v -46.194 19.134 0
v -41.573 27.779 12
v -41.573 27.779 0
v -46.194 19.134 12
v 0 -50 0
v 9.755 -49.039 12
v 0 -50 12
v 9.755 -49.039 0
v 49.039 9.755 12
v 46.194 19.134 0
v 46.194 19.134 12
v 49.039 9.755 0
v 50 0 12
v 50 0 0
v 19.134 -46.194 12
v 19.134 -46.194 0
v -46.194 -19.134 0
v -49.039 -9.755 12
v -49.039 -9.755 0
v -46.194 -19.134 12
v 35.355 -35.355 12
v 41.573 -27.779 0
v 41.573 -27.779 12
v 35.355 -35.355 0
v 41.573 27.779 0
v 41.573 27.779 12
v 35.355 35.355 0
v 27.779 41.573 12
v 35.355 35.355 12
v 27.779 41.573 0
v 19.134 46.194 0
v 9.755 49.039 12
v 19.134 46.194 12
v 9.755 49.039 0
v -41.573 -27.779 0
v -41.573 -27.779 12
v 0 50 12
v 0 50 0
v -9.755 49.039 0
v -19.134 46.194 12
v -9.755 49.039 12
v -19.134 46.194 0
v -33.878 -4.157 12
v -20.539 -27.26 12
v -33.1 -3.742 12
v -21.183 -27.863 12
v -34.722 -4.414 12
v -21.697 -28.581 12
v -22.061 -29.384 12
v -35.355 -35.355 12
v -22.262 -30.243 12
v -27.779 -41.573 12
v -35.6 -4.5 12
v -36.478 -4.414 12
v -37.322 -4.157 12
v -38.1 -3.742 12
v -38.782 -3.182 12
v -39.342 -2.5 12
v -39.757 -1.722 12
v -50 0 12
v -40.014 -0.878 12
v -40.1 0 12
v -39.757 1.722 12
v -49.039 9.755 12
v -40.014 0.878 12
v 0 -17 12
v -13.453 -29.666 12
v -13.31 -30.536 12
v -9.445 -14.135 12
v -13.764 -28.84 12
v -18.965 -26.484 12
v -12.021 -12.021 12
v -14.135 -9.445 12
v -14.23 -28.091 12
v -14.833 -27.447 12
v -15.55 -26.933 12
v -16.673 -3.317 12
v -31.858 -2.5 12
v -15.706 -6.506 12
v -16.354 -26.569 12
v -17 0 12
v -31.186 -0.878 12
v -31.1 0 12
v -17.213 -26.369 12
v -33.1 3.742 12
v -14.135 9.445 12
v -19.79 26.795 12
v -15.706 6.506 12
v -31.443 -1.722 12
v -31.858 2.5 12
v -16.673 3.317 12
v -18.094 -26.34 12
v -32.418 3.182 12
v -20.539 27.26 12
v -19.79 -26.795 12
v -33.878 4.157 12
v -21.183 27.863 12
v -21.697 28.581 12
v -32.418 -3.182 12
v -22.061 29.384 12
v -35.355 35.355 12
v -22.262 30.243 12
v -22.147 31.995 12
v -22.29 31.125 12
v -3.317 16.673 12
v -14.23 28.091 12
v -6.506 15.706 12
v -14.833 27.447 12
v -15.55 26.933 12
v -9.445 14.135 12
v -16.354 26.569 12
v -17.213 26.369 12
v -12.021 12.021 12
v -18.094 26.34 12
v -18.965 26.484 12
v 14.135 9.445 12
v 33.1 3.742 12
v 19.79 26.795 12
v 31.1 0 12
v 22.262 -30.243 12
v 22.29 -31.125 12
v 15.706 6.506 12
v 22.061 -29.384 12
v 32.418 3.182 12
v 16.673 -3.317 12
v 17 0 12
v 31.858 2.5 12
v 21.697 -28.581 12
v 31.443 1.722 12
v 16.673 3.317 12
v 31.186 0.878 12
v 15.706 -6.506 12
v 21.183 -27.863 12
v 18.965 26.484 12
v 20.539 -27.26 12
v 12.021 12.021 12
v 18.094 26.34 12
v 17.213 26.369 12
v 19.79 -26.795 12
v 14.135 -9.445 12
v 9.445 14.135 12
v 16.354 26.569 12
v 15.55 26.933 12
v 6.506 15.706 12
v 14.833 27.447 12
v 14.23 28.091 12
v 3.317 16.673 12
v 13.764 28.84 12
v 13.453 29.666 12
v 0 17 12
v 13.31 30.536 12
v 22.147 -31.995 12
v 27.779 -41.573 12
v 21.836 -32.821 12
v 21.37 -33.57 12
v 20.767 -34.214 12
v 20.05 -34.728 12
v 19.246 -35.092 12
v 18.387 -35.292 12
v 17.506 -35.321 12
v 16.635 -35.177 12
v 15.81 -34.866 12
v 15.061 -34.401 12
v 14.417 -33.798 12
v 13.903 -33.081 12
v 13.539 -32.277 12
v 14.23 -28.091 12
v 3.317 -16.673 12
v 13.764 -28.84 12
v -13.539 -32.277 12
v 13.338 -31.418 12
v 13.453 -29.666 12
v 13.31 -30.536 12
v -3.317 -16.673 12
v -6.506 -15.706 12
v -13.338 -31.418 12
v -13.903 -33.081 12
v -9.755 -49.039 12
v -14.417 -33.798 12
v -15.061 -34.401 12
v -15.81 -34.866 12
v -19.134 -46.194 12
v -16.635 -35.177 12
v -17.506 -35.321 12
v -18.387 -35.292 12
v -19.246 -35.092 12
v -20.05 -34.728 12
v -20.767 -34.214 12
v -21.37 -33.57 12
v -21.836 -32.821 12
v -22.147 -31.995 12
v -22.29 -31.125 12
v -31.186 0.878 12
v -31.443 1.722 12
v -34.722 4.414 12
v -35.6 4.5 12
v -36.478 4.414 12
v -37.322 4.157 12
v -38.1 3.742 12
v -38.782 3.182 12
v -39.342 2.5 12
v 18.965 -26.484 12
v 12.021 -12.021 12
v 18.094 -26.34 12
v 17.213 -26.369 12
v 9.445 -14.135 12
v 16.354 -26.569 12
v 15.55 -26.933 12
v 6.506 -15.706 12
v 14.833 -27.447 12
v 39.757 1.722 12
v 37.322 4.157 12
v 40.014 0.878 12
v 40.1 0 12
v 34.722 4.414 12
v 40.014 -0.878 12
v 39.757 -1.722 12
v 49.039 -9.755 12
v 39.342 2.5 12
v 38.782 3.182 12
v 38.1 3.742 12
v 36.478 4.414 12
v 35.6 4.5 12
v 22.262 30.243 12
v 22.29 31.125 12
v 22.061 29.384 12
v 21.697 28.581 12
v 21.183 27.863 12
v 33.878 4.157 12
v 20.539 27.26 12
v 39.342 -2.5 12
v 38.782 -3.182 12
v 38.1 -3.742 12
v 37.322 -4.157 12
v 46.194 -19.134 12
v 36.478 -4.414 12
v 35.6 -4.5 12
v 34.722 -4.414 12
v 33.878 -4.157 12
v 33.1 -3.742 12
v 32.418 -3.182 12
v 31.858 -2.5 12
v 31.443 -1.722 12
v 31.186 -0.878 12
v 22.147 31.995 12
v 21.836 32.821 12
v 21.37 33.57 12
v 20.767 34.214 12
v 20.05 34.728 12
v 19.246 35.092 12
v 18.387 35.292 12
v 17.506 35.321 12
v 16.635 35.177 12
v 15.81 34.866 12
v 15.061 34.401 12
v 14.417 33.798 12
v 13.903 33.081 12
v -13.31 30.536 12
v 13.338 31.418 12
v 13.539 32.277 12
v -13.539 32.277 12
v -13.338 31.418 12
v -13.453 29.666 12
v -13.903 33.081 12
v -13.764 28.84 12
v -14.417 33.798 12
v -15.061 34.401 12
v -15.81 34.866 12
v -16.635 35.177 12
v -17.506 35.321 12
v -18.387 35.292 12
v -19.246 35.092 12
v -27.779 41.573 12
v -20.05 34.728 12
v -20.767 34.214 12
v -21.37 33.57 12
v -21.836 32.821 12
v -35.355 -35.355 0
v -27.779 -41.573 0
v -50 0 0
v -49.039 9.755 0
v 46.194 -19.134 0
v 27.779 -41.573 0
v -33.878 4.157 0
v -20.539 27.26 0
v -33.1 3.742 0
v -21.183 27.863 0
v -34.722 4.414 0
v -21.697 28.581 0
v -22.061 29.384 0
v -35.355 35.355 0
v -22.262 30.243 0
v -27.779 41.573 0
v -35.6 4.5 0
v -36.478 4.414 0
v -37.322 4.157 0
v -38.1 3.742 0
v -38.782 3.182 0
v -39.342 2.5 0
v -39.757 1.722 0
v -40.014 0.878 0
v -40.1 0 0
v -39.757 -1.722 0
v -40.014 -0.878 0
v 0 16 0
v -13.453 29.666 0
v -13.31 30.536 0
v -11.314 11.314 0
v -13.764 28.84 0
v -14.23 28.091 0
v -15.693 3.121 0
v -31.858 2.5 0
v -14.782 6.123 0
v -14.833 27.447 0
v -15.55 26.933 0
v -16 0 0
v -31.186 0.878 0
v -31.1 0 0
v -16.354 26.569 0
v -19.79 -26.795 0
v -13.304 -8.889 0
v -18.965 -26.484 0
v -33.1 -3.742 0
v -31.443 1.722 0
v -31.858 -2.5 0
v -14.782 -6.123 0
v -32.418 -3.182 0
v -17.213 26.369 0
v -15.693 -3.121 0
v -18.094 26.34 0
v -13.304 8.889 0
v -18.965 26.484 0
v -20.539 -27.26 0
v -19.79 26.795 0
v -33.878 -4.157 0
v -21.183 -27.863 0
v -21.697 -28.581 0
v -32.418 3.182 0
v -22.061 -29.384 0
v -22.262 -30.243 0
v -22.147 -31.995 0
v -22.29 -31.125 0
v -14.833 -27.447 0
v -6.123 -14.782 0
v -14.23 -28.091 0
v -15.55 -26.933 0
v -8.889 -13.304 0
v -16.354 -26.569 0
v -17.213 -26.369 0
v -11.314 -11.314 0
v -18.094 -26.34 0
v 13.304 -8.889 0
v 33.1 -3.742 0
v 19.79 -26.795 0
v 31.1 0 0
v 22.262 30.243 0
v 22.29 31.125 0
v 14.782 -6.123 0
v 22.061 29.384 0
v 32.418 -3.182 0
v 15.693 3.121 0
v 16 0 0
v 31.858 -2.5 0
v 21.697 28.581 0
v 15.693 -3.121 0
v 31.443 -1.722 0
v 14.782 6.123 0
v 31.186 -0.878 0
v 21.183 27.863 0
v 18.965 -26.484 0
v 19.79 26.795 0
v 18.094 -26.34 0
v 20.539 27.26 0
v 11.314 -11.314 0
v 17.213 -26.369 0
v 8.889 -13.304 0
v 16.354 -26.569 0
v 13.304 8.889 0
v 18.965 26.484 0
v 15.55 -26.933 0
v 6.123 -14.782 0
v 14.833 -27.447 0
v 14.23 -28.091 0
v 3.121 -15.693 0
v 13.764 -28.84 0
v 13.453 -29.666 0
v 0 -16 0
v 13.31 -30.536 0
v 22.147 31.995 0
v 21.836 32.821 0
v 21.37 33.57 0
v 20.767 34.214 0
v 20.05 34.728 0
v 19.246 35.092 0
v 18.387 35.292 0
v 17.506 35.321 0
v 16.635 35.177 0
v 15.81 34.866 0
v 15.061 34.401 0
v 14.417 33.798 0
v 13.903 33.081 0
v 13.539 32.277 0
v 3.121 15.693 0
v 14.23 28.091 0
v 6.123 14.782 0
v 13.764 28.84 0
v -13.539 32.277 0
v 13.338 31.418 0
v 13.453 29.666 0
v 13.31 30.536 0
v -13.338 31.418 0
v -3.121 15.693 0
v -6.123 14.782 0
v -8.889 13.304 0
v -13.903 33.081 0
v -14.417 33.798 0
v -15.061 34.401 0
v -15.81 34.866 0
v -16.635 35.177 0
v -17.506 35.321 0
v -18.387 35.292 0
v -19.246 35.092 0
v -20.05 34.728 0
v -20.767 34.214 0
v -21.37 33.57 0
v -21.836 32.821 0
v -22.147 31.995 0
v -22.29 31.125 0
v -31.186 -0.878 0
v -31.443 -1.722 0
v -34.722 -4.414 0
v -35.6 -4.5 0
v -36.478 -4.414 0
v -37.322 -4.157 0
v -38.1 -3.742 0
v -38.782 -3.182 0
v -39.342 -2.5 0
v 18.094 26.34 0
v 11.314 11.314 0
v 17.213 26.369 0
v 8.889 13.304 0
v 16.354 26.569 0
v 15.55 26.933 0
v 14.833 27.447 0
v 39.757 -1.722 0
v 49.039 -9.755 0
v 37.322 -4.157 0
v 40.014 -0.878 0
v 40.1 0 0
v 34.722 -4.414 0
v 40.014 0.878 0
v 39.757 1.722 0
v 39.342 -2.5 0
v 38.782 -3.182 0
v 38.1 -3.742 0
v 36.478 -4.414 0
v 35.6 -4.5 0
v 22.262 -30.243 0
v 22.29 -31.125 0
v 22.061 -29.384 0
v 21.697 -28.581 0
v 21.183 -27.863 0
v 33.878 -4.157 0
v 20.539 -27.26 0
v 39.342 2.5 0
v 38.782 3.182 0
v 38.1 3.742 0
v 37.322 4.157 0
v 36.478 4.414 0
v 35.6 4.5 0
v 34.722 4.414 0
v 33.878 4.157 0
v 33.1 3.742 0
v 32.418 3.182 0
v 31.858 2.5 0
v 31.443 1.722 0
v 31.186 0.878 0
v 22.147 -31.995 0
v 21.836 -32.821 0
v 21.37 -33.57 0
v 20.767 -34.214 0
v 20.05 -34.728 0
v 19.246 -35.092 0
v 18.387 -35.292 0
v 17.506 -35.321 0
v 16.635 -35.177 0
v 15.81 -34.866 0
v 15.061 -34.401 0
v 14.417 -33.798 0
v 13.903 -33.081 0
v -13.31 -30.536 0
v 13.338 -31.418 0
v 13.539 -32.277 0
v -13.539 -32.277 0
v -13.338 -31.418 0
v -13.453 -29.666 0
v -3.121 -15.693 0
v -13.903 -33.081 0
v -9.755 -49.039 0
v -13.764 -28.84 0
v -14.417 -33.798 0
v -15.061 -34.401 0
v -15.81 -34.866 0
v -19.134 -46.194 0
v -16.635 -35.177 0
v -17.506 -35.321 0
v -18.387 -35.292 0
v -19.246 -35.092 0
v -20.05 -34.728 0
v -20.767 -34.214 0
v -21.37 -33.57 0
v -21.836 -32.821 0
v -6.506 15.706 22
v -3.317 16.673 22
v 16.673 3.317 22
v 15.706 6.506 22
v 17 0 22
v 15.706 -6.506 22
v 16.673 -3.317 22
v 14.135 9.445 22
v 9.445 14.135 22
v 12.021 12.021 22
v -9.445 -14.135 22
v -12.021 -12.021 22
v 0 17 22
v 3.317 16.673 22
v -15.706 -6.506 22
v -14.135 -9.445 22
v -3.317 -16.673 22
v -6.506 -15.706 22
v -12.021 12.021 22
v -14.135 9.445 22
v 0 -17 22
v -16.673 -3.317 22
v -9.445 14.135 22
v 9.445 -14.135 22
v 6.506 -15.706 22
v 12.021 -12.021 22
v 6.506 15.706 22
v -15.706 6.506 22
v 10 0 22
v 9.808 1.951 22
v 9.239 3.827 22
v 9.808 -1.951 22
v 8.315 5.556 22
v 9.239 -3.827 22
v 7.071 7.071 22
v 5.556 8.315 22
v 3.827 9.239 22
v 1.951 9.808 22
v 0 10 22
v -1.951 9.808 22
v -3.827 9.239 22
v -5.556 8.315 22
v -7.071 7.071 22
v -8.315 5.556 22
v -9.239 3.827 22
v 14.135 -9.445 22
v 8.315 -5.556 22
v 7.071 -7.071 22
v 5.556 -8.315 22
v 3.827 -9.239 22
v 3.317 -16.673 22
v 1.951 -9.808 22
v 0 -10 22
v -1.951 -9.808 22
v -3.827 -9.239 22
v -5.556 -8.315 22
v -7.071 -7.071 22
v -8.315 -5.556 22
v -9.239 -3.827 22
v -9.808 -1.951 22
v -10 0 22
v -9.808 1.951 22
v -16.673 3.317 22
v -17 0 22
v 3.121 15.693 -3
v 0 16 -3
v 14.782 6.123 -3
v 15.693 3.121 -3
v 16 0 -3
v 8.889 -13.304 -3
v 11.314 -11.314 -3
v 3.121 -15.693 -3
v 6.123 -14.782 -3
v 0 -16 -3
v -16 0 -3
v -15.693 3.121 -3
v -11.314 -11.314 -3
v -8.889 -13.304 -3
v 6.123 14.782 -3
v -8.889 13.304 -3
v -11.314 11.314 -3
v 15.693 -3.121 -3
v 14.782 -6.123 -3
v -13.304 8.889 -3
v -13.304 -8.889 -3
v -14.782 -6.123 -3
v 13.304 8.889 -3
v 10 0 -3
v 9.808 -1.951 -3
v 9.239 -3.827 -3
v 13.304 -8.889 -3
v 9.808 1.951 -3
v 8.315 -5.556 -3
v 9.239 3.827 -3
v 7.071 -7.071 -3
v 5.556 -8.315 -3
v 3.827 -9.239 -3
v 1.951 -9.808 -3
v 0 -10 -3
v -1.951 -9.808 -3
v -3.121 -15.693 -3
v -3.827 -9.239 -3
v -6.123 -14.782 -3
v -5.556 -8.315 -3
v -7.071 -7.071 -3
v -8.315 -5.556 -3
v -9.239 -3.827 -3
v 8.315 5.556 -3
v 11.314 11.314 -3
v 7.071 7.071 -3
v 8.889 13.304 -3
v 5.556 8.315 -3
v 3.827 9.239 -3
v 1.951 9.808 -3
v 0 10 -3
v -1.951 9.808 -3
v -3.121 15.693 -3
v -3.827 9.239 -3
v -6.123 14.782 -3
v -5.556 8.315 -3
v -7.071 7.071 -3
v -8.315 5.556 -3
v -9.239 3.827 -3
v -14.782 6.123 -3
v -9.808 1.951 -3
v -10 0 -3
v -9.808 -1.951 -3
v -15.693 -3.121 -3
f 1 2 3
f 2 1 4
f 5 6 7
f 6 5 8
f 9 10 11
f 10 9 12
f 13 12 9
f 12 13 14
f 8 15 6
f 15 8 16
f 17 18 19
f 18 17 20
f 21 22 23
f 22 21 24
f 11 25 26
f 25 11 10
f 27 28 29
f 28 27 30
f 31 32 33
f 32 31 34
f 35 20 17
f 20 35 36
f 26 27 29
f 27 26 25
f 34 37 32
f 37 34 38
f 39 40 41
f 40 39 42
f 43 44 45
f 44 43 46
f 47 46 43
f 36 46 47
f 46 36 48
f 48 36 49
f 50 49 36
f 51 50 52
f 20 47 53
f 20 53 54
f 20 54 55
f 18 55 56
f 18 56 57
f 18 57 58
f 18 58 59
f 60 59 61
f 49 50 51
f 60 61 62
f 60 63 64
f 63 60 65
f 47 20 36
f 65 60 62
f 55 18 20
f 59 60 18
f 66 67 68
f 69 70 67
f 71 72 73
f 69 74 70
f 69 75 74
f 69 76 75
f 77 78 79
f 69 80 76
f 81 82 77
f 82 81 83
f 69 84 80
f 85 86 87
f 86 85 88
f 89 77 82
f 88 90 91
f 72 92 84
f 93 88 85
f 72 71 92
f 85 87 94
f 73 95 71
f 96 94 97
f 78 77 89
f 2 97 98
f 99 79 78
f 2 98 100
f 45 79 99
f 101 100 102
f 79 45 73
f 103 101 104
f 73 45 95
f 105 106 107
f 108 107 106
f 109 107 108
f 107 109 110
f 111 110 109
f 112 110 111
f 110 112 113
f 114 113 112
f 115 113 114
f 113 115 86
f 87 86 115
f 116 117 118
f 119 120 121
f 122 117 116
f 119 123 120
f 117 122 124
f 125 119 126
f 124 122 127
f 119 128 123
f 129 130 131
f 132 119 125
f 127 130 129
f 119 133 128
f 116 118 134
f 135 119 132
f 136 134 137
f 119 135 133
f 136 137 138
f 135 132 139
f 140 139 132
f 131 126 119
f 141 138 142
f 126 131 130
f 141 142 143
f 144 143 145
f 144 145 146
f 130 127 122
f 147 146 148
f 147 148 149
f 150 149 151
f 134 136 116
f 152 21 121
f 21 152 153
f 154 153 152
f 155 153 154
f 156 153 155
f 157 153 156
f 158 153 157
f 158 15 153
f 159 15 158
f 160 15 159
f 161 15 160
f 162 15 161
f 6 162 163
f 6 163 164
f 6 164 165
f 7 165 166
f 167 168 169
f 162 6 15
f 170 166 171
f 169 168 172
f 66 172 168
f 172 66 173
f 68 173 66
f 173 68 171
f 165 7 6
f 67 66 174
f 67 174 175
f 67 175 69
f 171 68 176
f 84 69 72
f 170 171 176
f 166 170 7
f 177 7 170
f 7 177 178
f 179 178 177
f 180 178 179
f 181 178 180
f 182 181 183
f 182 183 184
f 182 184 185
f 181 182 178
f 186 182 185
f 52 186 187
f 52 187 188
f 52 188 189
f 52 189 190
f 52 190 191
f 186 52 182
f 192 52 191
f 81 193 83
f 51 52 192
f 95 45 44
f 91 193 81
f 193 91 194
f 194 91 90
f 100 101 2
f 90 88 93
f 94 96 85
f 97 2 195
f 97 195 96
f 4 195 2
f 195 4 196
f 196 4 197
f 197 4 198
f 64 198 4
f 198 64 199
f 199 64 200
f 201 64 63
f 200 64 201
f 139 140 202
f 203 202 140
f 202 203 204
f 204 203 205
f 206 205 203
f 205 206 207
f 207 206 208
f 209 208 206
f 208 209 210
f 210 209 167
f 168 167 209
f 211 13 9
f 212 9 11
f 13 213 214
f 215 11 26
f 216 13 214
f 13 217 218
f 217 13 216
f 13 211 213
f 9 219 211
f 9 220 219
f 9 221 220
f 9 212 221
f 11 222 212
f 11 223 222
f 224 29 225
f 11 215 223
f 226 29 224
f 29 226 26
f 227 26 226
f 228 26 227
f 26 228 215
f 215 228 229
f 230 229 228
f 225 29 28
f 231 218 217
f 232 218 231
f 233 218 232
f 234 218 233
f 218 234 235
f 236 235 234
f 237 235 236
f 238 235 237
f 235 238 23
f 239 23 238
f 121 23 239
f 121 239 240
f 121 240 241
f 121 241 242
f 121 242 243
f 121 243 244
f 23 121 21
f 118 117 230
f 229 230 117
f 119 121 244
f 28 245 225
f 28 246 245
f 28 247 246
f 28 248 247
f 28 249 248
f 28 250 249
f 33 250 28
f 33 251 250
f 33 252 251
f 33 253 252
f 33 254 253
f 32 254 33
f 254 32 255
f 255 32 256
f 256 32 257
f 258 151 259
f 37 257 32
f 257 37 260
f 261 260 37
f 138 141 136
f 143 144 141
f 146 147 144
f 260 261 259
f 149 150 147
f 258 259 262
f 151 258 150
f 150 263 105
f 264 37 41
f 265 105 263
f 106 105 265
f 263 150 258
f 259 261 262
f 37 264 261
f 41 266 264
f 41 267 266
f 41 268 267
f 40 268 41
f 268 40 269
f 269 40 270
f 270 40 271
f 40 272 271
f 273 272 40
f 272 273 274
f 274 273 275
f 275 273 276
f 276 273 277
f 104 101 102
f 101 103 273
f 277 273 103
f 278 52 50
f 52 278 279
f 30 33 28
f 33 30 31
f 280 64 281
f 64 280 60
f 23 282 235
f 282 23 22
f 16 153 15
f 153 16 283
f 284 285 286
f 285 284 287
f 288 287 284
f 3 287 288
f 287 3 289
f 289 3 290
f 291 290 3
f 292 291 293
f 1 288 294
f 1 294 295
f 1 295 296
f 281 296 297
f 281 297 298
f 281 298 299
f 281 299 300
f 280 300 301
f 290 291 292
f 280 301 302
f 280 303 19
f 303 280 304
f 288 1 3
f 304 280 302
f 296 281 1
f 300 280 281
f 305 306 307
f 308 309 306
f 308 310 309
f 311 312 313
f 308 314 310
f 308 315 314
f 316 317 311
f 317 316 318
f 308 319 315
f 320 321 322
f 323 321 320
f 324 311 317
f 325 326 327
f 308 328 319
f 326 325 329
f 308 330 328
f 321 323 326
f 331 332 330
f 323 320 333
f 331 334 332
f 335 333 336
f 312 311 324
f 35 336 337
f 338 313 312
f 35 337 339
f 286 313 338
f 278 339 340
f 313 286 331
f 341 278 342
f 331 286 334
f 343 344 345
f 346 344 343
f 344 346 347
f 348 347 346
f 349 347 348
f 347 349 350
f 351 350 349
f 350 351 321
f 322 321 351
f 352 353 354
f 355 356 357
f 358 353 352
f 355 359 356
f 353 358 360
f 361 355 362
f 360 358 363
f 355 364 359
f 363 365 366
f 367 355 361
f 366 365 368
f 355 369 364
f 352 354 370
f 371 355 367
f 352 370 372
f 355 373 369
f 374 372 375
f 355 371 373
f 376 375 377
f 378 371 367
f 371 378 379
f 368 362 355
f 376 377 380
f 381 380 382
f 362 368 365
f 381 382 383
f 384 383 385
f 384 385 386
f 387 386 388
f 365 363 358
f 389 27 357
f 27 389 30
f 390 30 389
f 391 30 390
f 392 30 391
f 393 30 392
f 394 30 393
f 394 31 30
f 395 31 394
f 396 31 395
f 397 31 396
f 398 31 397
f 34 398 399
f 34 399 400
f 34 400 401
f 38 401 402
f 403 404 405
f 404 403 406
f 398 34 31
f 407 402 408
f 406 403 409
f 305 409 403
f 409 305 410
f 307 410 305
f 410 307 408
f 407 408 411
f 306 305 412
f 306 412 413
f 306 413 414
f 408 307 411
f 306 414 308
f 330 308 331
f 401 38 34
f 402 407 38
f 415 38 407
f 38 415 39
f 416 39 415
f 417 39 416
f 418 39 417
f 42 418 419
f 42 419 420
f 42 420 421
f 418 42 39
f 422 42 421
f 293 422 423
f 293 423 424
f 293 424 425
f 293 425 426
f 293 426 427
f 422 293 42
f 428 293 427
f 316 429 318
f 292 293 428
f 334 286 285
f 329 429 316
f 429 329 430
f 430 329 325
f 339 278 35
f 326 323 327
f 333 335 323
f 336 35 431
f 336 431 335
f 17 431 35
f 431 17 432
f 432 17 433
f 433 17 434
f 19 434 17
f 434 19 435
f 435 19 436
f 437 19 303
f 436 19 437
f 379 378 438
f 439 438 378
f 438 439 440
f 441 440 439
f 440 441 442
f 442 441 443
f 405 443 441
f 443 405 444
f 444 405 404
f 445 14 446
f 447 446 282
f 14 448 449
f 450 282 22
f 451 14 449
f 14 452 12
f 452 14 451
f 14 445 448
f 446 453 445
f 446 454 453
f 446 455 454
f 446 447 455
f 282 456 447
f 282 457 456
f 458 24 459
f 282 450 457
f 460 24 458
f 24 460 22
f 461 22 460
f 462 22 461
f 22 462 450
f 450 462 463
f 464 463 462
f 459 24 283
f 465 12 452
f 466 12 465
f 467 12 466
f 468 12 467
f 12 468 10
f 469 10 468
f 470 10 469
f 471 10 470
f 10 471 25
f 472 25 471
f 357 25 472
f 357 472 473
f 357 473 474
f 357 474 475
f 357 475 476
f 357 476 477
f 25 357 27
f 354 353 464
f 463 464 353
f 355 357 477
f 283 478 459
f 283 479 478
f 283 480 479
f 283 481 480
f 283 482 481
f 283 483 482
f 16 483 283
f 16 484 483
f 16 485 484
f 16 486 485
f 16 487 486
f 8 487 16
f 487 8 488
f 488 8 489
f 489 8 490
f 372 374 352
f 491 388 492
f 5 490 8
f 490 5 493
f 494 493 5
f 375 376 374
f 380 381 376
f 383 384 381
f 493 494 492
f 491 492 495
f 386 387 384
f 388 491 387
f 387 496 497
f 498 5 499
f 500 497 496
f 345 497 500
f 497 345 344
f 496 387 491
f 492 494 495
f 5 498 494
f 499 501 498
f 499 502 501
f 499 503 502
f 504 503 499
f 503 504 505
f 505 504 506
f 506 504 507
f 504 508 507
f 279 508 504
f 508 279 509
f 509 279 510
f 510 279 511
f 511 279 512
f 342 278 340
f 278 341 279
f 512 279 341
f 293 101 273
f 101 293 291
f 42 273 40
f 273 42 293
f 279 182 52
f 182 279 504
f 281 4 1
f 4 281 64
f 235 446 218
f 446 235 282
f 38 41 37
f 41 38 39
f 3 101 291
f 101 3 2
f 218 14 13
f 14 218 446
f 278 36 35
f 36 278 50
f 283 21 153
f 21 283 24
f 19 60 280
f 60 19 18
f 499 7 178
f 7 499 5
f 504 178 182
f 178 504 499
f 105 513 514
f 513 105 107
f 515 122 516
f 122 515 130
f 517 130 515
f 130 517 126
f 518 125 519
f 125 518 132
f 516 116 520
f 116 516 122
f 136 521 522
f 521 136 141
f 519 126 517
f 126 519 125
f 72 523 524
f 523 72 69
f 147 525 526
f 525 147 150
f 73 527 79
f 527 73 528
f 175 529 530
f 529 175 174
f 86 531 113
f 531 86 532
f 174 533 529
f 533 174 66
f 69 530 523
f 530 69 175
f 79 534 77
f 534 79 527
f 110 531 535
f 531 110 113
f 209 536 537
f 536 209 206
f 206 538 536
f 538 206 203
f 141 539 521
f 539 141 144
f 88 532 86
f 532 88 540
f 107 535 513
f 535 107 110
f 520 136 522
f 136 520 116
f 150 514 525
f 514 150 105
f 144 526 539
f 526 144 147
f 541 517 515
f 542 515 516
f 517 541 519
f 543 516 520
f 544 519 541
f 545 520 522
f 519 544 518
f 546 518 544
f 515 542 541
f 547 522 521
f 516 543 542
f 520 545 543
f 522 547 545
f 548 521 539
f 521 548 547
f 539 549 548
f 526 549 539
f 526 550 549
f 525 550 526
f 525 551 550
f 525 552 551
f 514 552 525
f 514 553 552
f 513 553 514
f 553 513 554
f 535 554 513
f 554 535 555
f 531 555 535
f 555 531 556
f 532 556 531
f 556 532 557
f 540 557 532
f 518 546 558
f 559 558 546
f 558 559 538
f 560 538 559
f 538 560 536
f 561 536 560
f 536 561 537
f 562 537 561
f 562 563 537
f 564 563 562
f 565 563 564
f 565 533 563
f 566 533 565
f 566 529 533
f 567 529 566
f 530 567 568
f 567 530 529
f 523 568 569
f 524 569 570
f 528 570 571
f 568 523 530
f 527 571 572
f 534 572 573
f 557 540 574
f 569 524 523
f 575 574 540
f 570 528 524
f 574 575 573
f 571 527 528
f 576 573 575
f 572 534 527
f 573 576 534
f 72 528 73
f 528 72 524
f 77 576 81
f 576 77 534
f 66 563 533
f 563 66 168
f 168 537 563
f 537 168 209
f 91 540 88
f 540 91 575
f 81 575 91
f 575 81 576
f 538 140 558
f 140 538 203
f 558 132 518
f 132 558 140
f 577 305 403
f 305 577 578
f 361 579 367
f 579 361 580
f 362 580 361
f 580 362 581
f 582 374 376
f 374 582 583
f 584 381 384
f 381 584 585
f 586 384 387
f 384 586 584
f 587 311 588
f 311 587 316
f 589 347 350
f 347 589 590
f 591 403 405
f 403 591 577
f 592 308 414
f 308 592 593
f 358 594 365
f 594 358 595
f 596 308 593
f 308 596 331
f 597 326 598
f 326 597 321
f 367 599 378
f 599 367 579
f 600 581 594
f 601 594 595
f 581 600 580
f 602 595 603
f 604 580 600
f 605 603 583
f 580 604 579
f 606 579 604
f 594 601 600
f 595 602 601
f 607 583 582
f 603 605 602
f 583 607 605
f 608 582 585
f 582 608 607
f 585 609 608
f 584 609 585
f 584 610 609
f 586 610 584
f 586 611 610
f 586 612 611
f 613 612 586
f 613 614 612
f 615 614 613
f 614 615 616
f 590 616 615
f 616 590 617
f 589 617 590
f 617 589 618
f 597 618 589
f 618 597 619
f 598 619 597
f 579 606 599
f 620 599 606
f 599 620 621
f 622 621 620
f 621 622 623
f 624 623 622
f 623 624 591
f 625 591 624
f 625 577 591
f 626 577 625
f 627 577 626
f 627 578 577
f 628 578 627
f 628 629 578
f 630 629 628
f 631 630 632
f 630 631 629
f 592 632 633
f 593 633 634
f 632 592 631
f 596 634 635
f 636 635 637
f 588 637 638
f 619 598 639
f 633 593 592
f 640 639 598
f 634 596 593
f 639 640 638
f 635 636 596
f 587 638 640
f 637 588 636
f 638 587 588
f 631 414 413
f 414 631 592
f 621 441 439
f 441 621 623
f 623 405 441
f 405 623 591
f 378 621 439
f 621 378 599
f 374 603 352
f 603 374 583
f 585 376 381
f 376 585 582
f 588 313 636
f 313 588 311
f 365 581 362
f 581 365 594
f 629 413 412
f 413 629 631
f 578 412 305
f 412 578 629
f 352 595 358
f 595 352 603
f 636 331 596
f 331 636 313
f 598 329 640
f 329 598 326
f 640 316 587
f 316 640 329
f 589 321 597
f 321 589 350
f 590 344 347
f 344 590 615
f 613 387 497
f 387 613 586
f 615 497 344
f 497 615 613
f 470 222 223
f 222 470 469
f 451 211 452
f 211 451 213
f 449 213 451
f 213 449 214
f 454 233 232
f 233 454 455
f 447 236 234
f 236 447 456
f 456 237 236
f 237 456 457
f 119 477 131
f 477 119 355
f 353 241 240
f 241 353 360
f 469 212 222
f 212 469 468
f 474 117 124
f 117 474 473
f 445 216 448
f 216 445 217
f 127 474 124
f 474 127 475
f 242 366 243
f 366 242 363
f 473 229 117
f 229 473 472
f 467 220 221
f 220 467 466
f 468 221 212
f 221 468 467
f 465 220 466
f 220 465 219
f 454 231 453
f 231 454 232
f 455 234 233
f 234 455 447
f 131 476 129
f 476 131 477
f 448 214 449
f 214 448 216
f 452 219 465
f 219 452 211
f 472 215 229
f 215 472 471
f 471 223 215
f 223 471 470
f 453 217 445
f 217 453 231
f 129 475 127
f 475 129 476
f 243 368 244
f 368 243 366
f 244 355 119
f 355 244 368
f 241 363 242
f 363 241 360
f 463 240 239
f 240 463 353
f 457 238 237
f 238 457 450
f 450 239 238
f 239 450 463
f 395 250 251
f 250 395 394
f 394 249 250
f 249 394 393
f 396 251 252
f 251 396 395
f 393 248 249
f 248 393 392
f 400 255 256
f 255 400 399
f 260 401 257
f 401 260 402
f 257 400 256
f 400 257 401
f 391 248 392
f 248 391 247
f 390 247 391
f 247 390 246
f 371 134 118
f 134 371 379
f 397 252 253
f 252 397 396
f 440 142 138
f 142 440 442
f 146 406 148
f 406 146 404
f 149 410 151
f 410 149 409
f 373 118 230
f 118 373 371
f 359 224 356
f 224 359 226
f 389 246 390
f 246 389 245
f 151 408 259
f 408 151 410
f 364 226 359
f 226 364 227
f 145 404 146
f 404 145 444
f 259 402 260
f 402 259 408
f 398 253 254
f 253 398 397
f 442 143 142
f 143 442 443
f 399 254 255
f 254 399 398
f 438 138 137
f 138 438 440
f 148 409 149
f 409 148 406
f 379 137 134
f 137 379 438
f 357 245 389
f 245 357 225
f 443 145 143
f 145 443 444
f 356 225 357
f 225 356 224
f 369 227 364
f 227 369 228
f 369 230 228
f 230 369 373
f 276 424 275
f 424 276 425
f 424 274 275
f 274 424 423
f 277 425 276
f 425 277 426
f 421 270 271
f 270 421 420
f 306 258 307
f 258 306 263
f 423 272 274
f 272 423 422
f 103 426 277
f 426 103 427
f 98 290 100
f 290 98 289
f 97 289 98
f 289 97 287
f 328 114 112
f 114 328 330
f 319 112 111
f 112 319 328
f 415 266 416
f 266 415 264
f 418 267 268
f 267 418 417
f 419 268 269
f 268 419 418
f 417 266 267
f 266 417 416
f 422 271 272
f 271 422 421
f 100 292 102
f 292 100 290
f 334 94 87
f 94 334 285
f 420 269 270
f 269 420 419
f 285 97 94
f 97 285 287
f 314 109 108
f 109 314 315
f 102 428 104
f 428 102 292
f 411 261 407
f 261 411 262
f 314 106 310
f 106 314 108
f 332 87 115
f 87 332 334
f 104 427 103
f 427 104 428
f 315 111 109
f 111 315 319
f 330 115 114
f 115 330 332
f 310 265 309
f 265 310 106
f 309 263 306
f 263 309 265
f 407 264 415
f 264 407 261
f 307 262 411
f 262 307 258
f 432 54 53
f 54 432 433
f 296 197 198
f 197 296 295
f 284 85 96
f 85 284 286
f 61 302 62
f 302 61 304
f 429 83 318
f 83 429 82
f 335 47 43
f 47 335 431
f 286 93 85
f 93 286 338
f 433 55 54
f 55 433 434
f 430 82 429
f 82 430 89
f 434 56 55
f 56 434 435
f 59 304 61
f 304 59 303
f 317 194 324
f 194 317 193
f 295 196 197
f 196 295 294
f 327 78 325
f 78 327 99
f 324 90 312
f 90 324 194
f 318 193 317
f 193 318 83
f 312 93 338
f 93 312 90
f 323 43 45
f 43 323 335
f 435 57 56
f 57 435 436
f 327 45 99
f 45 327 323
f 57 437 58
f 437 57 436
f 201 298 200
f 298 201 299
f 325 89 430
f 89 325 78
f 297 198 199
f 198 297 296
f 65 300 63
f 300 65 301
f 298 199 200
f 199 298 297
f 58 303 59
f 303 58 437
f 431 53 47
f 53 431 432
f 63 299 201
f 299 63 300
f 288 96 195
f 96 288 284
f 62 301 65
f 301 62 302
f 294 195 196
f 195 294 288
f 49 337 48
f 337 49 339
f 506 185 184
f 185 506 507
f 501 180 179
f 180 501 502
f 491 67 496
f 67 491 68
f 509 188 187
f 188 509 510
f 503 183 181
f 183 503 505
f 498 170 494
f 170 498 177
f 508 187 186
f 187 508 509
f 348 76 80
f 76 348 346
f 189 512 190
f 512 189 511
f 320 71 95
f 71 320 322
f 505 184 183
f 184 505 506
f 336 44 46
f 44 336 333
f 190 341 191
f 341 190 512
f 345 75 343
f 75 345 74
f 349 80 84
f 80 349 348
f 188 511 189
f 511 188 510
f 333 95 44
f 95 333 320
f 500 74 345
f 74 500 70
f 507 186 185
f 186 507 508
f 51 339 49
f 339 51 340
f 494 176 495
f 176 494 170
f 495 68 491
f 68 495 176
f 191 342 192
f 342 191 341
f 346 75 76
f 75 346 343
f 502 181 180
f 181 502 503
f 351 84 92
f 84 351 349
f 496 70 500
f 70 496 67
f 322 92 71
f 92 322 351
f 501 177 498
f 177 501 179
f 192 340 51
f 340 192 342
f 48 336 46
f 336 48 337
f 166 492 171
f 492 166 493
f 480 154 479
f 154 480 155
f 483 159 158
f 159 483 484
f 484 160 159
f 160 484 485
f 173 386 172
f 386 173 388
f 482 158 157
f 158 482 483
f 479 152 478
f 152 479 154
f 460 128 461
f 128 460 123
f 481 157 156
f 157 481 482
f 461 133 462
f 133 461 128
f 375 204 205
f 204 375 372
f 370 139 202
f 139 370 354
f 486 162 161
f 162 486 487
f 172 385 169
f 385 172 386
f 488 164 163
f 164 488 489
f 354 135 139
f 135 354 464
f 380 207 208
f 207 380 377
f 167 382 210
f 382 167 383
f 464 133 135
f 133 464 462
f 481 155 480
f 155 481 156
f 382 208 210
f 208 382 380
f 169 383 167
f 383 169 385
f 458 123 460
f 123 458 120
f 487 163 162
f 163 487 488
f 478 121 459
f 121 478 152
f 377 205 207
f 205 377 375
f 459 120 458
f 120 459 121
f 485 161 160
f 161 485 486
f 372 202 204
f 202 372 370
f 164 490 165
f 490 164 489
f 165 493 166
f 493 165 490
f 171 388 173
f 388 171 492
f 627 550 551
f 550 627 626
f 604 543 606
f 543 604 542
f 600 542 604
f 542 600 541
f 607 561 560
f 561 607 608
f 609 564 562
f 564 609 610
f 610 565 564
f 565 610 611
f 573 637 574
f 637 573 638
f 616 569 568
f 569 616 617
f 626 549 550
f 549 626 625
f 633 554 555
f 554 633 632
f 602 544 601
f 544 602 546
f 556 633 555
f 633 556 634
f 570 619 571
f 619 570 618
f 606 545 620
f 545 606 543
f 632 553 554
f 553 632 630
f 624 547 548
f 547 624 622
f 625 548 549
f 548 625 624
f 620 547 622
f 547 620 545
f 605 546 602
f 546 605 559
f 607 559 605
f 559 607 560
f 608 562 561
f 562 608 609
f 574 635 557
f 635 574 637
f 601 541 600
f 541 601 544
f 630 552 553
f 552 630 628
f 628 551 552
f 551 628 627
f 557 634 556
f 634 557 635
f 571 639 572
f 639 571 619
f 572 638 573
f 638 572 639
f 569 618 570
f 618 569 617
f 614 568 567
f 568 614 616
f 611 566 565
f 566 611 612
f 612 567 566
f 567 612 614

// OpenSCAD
$fn = 32;

// ----------------------------------------------------------------------
// Bolt-circle flange: 100 mm outside, 6 bolt holes, bore 20 mm
// ----------------------------------------------------------------------

// --- parameters (mm) ---
flange_d = 100;           // flange outside diameter
flange_t = 12;            // flange thickness
bolts = 6;                // number of bolt holes
bolt_d = 9;               // bolt clearance
bolt_r = 35.6;            // bolt circle radius
bore_d = 20;              // centre bore
hub_d = 34;               // raised hub diameter
hub_h = 10;               // raised hub height
spigot_d = 32;            // spigot diameter
spigot_h = 4;             // spigot height below the flange
sink = 1;                 // overlap into the flange

module body() {
  cylinder(h = flange_t, d = flange_d);
  /* raised hub, sunk 1 mm into the flange */
  translate([0, 0, flange_t - 1]) cylinder(h = hub_h + 1, d = hub_d);
  /* spigot on the back face, sunk into the flange */
  translate([0, 0, -spigot_h + sink]) cylinder(h = spigot_h, d = spigot_d);
}

difference() {
  body();
  /* bolt circle */
  for (i = [0 : bolts - 1]) rotate([0, 0, i * 360 / bolts]) translate([bolt_r, 0, -spigot_h - 1]) cylinder(h = flange_t + hub_h + spigot_h + 3, d = bolt_d);
  translate([0, 0, -spigot_h - 1]) cylinder(h = flange_t + hub_h + spigot_h + 3, d = bore_d);
}
